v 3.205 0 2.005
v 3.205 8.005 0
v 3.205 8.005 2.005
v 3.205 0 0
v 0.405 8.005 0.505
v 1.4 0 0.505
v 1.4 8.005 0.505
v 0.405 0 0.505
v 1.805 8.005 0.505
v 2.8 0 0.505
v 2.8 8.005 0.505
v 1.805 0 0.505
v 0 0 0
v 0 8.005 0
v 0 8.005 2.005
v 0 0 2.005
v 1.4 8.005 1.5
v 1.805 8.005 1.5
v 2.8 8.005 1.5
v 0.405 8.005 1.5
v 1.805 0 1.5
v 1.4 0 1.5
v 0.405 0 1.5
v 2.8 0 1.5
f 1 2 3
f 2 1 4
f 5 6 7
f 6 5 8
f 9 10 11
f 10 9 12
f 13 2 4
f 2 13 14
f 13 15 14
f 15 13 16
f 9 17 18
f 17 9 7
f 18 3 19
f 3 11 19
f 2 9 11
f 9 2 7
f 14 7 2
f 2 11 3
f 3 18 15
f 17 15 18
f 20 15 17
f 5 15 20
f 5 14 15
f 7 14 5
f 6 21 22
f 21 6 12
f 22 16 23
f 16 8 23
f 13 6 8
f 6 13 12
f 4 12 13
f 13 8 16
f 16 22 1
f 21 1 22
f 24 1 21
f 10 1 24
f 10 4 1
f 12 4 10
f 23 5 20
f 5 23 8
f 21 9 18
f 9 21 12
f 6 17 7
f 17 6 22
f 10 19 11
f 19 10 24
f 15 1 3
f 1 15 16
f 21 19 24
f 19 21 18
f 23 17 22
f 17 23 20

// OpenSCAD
length = 8;

bottom_wall = 0.5;
lower_wall = 0.4;
lower_hole = 1.0;
inner_wall = 0.4;
top_wall = 0.5;

x0 = 0;
x1 = x0 + lower_wall;
x2 = x1 + lower_hole;
x3 = x2 + inner_wall;
x4 = x3 + lower_hole;
x5 = x4 + lower_wall;
lower_width = x5;

y0 = 0;

z0 = 0;
z1 = z0 + bottom_wall;
z2 = z1 + lower_hole;
z3 = z2 + top_wall;

variance = 0.005;
function addv(dims) = [ dims[0]+variance, dims[1]+variance, dims[2]+variance ];

translate([x0, y0, z0]) cube(addv([lower_width, length, bottom_wall]));

translate([x0, y0, z1]) cube(addv([lower_wall, length, lower_hole]));
translate([x2, y0, z1]) cube(addv([inner_wall, length, lower_hole]));
translate([x4, y0, z1]) cube(addv([lower_wall, length, lower_hole]));

translate([x0, y0, z2]) cube(addv([lower_width, length, top_wall]));
